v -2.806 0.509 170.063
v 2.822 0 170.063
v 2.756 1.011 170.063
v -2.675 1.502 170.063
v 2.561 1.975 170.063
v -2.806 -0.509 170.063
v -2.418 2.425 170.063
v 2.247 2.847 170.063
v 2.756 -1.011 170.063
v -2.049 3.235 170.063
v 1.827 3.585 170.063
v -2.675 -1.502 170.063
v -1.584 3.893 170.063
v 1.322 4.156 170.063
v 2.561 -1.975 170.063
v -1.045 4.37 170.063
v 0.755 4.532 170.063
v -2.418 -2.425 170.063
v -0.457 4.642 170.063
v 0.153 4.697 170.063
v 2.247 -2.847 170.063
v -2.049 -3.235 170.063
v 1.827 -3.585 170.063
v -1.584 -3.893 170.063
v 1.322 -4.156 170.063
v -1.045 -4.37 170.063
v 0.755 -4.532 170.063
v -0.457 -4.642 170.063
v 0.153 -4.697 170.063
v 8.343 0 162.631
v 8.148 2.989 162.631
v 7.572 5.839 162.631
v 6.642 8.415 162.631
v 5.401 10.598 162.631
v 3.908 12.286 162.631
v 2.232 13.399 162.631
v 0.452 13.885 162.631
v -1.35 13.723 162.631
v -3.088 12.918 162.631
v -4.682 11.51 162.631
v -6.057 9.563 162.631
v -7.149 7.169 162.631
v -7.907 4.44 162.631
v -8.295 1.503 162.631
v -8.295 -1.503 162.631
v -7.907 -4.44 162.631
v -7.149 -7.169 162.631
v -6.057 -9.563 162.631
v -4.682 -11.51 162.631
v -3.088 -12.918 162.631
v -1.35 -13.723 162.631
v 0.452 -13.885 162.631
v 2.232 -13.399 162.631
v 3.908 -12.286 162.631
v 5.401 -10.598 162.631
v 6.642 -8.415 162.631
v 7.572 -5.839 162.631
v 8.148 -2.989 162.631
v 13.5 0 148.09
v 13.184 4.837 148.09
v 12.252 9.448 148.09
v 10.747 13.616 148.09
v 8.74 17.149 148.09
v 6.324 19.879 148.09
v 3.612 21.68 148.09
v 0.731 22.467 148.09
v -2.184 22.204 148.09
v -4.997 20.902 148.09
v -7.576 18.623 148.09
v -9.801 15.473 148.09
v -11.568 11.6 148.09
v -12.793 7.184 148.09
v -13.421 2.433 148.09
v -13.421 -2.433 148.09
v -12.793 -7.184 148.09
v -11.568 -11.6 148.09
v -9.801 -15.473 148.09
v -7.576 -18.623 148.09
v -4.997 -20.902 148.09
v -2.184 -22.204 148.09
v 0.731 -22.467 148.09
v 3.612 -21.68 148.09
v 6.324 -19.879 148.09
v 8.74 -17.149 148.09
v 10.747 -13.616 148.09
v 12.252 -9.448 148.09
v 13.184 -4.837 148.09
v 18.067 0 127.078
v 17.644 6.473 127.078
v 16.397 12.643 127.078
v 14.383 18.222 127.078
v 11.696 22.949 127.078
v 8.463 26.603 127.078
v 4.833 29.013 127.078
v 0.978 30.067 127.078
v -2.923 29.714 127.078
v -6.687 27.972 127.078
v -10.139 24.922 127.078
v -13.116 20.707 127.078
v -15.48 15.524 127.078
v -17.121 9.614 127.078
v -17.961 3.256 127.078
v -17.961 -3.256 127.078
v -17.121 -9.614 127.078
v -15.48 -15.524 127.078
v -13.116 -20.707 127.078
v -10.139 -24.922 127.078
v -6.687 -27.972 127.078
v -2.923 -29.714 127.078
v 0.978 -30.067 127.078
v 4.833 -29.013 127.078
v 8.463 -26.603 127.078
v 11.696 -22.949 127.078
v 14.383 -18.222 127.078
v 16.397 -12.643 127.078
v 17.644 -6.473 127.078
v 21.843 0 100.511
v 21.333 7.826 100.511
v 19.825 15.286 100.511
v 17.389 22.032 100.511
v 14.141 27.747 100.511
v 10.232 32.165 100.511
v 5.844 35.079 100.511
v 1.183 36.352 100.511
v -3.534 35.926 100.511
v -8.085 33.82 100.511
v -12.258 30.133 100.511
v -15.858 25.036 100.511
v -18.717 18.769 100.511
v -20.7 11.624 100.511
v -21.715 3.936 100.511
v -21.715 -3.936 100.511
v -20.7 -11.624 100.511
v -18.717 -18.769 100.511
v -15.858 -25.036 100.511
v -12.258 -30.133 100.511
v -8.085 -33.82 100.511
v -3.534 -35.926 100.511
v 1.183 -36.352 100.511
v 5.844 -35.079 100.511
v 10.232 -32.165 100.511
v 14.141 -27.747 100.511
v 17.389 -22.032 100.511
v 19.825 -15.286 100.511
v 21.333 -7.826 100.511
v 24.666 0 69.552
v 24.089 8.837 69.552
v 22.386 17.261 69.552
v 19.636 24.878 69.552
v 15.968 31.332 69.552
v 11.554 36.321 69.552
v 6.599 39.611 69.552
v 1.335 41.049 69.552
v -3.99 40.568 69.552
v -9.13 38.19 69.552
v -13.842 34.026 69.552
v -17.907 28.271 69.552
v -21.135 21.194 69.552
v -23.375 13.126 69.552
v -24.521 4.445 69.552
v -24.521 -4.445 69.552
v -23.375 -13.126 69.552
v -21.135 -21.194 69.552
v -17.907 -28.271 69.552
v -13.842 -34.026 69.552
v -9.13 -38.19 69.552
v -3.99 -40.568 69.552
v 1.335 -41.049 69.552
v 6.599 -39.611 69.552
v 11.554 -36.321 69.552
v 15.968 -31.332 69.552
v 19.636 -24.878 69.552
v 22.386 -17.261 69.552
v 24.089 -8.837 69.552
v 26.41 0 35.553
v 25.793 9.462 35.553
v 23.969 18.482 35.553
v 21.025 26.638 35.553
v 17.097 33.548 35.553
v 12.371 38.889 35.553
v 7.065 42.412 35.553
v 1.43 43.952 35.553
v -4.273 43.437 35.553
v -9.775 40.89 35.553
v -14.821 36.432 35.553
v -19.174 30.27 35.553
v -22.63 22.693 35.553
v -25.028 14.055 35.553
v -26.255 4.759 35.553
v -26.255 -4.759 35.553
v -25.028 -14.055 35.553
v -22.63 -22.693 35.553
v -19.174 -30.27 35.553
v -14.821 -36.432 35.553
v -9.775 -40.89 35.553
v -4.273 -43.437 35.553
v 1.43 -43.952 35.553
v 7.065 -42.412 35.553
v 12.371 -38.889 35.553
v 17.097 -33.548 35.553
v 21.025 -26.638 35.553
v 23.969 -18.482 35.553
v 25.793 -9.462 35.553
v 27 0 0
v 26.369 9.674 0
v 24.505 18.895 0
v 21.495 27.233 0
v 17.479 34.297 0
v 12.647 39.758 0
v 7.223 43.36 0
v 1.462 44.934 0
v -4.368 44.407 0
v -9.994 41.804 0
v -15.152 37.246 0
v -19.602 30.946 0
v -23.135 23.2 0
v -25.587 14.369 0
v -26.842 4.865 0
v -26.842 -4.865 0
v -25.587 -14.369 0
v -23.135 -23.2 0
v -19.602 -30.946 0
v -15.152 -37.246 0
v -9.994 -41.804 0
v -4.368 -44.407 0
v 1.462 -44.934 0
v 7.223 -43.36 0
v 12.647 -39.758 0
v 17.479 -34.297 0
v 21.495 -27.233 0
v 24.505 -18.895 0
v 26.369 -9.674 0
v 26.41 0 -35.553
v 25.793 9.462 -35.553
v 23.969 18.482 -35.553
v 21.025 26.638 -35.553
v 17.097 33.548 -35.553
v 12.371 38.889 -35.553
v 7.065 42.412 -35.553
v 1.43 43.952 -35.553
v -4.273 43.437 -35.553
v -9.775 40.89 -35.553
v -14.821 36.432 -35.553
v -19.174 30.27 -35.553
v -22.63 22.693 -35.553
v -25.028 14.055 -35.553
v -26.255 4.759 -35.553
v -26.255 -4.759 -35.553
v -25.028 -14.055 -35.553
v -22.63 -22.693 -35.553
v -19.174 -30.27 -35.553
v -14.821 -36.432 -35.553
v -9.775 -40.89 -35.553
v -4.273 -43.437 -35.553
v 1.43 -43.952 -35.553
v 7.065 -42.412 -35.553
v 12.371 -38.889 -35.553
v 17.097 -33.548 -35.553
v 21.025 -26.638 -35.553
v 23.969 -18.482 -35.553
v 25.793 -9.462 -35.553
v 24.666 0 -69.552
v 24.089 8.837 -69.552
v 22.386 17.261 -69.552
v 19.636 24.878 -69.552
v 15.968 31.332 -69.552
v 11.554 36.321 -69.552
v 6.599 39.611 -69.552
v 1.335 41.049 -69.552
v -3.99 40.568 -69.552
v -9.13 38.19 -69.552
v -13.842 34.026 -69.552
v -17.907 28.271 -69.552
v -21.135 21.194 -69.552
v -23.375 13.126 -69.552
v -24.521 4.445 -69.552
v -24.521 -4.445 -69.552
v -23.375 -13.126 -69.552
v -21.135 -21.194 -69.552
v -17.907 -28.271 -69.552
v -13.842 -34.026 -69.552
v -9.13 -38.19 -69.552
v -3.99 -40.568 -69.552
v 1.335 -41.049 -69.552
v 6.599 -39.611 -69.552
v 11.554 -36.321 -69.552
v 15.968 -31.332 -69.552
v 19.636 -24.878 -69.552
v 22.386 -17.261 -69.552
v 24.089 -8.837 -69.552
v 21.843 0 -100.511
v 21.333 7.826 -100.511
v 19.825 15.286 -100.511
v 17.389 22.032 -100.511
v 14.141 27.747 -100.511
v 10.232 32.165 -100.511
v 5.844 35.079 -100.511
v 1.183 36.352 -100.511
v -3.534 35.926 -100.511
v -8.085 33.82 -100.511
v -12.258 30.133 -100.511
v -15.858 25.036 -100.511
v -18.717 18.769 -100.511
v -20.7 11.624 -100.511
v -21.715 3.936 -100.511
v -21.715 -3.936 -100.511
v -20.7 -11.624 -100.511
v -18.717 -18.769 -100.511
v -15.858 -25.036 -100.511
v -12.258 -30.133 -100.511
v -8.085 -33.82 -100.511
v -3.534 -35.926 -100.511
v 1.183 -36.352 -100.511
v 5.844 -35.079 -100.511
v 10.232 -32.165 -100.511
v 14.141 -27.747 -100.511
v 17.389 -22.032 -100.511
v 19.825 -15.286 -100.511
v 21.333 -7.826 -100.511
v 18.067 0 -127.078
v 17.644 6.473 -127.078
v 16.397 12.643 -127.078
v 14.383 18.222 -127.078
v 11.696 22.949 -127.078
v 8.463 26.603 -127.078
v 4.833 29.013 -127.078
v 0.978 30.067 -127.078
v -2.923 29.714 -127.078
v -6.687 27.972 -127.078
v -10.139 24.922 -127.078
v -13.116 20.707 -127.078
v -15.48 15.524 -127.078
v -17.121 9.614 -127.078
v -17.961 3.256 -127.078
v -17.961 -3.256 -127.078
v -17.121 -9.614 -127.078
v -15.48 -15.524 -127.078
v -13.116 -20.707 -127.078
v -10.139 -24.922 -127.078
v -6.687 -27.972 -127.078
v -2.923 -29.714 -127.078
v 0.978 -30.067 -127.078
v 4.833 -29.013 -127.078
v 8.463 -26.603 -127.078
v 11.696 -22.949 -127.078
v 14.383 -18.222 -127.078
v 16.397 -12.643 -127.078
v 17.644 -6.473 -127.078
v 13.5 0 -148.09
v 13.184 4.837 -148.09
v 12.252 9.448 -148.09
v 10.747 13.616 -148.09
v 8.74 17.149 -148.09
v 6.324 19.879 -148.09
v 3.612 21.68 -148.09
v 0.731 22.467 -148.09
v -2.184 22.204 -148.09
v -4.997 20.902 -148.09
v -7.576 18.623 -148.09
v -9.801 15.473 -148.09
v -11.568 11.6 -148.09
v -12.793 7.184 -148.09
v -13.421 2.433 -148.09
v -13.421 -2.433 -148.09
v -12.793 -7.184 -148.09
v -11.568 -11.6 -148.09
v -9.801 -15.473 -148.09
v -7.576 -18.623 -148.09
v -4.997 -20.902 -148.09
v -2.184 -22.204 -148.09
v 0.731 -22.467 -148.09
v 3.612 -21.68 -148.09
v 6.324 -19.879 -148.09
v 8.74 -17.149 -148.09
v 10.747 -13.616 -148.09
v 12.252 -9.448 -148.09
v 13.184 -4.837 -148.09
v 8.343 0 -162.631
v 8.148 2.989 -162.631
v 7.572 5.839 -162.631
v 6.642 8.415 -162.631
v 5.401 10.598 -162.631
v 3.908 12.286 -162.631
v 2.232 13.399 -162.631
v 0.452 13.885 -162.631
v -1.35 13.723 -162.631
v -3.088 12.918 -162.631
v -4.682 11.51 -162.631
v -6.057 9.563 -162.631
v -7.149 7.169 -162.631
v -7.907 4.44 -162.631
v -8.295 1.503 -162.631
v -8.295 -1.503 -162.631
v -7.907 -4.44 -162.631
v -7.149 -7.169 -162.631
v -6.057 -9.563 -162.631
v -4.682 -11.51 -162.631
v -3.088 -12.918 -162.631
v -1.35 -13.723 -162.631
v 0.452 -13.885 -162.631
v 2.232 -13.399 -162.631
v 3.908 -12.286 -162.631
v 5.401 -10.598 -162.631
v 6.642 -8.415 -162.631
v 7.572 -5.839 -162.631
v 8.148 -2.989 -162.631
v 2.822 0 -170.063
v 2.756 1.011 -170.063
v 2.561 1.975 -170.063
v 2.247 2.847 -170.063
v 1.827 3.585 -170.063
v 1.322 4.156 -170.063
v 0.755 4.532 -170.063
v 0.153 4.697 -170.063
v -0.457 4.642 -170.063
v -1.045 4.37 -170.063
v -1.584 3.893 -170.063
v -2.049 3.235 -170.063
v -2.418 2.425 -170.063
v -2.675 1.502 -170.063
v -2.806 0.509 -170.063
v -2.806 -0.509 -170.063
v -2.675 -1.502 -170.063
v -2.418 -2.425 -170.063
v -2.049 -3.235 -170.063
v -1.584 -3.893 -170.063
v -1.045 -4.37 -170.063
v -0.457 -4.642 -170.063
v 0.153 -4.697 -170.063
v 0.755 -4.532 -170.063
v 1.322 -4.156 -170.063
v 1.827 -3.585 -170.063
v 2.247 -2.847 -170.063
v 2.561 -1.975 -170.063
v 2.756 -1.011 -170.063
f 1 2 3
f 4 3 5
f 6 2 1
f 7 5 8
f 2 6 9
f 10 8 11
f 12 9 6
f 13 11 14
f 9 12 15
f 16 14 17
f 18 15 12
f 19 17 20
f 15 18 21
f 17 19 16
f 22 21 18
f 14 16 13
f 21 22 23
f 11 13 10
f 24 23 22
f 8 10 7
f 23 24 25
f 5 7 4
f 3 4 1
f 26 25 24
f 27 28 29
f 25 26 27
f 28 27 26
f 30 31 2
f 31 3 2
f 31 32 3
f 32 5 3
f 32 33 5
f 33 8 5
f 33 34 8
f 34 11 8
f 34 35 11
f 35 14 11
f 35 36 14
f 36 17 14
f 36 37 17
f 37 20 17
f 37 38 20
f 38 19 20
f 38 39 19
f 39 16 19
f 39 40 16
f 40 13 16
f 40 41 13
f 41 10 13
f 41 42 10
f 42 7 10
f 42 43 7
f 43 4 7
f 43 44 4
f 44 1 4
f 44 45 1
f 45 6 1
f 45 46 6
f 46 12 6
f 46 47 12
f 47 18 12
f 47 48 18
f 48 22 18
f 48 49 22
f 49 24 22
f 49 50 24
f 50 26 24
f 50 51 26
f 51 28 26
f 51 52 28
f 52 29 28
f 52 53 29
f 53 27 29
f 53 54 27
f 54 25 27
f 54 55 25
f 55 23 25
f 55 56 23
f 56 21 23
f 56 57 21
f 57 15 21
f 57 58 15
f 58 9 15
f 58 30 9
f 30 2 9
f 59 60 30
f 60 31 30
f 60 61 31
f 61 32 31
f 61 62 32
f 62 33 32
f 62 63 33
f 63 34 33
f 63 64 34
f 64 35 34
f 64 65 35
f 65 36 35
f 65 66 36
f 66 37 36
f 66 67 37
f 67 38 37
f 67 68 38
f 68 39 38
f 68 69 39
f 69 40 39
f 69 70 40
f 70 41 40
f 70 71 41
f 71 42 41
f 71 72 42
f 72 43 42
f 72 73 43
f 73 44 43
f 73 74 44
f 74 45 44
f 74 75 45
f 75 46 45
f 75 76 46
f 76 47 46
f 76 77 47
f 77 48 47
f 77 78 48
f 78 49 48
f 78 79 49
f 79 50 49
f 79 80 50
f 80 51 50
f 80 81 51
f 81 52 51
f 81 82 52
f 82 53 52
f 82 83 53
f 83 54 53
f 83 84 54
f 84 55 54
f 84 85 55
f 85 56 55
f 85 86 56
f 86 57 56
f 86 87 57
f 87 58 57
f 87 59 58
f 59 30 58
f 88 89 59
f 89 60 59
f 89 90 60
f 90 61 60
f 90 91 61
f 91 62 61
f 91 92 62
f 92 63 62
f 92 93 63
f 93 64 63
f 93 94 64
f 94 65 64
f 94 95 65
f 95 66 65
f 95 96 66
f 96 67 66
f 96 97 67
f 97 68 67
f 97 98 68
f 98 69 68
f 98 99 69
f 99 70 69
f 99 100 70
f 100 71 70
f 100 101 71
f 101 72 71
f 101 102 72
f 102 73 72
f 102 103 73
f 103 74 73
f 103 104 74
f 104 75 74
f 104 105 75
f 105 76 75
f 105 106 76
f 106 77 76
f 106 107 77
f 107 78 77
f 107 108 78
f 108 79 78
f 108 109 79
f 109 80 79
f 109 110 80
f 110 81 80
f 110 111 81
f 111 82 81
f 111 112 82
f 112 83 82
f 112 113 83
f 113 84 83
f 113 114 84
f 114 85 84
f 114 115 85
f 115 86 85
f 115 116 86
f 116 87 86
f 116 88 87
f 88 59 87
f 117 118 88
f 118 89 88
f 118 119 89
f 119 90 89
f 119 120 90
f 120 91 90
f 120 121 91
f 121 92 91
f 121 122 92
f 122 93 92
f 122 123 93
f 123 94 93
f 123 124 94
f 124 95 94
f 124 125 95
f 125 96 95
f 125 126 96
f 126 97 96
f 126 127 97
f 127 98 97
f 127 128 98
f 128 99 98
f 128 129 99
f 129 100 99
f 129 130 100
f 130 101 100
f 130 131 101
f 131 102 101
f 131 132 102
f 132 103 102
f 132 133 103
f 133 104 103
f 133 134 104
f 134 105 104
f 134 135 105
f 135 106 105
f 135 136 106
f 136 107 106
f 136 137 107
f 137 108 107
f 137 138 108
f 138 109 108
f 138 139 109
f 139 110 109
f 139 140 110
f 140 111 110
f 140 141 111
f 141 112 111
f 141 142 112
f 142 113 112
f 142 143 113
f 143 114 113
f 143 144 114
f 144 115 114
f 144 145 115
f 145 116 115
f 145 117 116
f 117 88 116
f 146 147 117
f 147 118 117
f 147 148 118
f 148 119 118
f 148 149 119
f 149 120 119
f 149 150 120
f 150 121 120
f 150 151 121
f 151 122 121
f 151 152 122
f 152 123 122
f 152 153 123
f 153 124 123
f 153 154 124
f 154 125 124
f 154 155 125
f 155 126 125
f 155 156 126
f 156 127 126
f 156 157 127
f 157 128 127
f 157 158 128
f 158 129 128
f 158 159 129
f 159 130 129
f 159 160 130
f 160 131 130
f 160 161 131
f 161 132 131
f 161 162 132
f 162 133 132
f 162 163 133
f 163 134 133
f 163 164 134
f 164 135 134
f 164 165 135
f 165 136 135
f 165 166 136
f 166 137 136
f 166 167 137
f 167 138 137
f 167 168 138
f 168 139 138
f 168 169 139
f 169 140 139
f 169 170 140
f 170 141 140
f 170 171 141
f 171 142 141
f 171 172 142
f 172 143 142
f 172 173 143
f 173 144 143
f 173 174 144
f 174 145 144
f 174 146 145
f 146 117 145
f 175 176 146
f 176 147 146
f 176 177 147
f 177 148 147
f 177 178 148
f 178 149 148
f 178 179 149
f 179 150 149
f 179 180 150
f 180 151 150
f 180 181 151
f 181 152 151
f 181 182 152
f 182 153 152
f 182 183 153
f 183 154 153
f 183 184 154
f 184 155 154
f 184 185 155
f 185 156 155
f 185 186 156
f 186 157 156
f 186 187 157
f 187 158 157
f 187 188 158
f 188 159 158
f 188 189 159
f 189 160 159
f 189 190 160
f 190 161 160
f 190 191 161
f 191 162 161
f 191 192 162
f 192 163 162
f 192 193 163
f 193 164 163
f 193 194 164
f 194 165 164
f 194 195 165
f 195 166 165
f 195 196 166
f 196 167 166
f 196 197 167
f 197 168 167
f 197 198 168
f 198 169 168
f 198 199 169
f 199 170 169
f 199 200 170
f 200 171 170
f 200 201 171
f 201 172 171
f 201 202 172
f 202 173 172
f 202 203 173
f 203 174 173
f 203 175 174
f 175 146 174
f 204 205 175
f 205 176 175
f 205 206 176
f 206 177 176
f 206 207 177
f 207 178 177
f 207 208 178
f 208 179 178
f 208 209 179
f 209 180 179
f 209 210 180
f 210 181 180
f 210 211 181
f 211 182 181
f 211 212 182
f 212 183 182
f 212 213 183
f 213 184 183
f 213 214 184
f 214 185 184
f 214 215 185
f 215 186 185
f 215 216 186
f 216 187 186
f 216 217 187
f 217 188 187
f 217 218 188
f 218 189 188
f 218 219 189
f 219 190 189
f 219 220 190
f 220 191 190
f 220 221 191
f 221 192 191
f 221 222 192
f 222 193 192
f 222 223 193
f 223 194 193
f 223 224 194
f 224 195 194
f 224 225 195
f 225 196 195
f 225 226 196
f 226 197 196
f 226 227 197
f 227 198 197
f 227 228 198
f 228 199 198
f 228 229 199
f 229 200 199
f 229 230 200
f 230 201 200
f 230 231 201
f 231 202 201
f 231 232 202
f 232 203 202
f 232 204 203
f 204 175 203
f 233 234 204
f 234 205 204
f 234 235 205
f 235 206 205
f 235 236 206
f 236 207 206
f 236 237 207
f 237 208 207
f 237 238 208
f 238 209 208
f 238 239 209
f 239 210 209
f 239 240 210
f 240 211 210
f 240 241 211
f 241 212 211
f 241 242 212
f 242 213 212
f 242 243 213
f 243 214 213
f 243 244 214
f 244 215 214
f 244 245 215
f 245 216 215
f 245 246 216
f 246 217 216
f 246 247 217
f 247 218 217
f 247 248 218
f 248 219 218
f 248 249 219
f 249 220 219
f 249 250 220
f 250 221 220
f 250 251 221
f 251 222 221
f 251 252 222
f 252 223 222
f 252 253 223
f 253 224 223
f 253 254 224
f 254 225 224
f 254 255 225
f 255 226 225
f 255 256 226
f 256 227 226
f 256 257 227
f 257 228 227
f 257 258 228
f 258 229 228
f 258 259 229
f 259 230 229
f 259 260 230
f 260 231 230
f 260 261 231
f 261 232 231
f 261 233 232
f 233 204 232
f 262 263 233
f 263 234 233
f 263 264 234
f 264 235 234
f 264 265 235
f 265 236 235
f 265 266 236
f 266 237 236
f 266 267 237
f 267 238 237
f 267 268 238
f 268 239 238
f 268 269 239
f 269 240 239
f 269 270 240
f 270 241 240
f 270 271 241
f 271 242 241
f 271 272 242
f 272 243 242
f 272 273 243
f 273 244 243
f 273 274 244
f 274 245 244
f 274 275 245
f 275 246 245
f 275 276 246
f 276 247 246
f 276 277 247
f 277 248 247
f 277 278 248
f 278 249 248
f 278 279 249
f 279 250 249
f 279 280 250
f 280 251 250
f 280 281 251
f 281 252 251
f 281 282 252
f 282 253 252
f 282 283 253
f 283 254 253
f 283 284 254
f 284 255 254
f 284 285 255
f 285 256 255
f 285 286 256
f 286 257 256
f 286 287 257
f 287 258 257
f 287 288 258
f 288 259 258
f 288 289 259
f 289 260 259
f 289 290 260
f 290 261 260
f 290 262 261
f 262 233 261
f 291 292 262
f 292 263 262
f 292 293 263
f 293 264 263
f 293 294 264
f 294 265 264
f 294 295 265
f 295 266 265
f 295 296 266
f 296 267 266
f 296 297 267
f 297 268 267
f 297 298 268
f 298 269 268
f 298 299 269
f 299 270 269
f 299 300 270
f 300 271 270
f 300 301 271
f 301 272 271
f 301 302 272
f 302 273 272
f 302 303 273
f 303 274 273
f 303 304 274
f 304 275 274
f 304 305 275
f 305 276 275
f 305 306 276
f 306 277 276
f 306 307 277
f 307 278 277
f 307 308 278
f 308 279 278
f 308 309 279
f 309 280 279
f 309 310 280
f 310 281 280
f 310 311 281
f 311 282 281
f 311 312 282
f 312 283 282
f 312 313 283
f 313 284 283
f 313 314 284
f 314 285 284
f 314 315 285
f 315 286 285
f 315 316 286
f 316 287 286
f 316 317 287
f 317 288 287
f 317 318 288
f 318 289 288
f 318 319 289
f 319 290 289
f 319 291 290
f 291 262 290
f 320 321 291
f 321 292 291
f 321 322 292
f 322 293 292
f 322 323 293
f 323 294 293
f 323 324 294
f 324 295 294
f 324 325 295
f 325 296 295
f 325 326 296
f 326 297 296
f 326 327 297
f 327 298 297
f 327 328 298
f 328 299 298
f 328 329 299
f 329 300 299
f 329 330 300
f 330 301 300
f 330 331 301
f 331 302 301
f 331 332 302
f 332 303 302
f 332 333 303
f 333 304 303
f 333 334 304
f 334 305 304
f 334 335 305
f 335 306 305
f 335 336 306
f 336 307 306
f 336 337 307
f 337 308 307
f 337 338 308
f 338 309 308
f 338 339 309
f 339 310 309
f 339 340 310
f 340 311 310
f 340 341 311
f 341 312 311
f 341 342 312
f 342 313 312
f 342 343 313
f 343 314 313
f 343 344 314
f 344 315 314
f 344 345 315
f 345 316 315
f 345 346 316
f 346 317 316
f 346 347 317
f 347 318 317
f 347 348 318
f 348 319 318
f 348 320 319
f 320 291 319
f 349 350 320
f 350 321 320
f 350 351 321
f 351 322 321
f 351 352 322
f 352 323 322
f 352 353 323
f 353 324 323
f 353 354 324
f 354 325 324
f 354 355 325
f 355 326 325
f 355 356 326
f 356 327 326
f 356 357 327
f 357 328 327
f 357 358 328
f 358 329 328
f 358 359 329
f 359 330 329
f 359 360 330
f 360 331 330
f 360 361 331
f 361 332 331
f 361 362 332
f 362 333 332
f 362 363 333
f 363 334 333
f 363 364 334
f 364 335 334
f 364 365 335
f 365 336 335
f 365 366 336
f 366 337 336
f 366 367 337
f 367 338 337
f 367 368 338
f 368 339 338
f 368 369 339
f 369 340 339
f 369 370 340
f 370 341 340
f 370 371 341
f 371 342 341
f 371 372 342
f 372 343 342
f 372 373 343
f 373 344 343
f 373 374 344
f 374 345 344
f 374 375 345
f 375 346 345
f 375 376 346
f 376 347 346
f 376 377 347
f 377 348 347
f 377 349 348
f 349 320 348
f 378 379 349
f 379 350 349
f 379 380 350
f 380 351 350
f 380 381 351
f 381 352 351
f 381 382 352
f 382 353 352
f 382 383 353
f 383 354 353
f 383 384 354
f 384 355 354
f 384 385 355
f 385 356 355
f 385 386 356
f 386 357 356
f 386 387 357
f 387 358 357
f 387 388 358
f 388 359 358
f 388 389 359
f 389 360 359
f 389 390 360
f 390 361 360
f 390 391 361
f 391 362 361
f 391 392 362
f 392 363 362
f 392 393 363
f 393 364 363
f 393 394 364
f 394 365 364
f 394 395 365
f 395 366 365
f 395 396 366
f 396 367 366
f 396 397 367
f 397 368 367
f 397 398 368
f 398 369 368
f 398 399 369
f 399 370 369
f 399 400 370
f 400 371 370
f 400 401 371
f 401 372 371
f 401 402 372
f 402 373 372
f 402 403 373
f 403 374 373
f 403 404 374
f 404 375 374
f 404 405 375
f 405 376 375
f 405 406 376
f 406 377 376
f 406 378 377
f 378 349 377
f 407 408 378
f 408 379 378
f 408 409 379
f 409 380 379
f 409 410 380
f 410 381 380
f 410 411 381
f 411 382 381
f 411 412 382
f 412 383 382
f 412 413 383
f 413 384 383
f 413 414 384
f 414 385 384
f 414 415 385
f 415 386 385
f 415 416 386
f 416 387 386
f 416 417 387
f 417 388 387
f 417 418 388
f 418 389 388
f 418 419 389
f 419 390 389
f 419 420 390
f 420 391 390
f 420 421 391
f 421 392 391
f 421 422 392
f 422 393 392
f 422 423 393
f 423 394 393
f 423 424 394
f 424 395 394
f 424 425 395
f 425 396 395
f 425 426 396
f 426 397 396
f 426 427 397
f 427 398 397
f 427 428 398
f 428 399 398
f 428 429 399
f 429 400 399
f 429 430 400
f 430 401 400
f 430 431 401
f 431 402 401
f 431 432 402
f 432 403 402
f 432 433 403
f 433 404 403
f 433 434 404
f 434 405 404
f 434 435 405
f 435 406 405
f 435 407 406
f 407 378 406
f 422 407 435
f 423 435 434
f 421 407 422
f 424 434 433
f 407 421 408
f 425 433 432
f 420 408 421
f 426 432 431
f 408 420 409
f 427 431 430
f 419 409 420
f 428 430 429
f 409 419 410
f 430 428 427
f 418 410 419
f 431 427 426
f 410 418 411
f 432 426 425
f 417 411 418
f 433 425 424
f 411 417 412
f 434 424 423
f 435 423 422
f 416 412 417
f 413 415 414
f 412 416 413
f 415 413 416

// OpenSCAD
// Generated by SolidPython 1.0.1 on 2020-07-29 00:46:45


scale(v = [3, 5, 19]) {
	sphere(r = 9);
}
/***********************************************
*********      SolidPython code:      **********
************************************************
 
# import packages: SolidPython
from solid import *
from solid.utils import *
from itertools import chain, combinations, permutations


class Resize:

    def __init__(self, scad_file):
        self.scad_file = scad_file
        #self.scad_file = import_scad(scad_file)
        # cone/cylinder param:
        self.r1 = 0
        self.r2 = 0
        self.h = 0
        # rectangular prism param:
        self.w = 0
        self.l = 0
        # ellipse param:
        self.r = 0

    # import OpenScad code (file name corresponds to shape)


    # classify shape + parameters
    def assign(self, param1, param2, param3):
        if self.scad_file == 'cone.scad':
            self.r1 = param1
            self.r2 = param2
            self.h = param3
        elif self.scad_file == 'cylinder.scad':
            self.r1 = param1
            self.r2 = param2
            self.h = param3
        elif self.scad_file == 'rectangularPrism.scad':
            self.h = param1
            self.l = param2
            self.w = param3
        else:
            self.r = param1
            self.h = param2

    # resize parameters
    def iterate(self):
        x = range(3, 20, 2)
        i = 1
        if self.scad_file == 'cone.scad':
            tempList = list(permutations(x, 2))
            for temp in tempList:
                param1 = temp[0]
                param2 = temp[1]
                filepath = 'produced_scad_files/' + 'cone' + str(param1) + '_' + str(param2) + '_' + '.scad'
                scad_render_to_file(cylinder(h=param1, r1=param2, r2=0), filepath)

        elif self.scad_file == 'cylinder.scad':
            tempList = list(permutations(x, 3))
            for temp in tempList:
                param1 = temp[0]
                param2 = temp[1]
                filepath = 'produced_scad_files/' + 'cylinder' + str(param1) + '_' + str(param2) + '_' + '.scad'
                scad_render_to_file(cylinder(h=param1, r1=param2, r2=param2), filepath)

        elif self.scad_file == 'rectangularPrism.scad':
            tempList = list(permutations(x, 3))
            for temp in tempList:
                param1 = temp[0]
                param2 = temp[1]
                param3 = temp[2]
                filepath = 'produced_scad_files/' + 'rectangularPrism' + str(param1) + '_' + str(param2) + '_' + str(
                    param3) + '.scad'
                scad_render_to_file(cube(size=(param1, param2, param3)), filepath)

        elif self.scad_file == 'ellipse.scad':
            tempList = list(permutations(x, 4))
            for temp in tempList:
                param1 = temp[0]
                param2 = temp[1]
                param3 = temp[2]
                param4 = temp[3]
                filepath = 'produced_scad_files/' + 'ellipse' + str(param1) + '_' + str(param2) + '_' + str(param3) + '_' + str(param4) + '.scad'
                scad_render_to_file(scale([param1, param2, param3])(sphere(r=param4)), filepath)

    def render_to_scadfile(self):
        scad_render_to_file(scad, 'example.scad') 
 
************************************************/
